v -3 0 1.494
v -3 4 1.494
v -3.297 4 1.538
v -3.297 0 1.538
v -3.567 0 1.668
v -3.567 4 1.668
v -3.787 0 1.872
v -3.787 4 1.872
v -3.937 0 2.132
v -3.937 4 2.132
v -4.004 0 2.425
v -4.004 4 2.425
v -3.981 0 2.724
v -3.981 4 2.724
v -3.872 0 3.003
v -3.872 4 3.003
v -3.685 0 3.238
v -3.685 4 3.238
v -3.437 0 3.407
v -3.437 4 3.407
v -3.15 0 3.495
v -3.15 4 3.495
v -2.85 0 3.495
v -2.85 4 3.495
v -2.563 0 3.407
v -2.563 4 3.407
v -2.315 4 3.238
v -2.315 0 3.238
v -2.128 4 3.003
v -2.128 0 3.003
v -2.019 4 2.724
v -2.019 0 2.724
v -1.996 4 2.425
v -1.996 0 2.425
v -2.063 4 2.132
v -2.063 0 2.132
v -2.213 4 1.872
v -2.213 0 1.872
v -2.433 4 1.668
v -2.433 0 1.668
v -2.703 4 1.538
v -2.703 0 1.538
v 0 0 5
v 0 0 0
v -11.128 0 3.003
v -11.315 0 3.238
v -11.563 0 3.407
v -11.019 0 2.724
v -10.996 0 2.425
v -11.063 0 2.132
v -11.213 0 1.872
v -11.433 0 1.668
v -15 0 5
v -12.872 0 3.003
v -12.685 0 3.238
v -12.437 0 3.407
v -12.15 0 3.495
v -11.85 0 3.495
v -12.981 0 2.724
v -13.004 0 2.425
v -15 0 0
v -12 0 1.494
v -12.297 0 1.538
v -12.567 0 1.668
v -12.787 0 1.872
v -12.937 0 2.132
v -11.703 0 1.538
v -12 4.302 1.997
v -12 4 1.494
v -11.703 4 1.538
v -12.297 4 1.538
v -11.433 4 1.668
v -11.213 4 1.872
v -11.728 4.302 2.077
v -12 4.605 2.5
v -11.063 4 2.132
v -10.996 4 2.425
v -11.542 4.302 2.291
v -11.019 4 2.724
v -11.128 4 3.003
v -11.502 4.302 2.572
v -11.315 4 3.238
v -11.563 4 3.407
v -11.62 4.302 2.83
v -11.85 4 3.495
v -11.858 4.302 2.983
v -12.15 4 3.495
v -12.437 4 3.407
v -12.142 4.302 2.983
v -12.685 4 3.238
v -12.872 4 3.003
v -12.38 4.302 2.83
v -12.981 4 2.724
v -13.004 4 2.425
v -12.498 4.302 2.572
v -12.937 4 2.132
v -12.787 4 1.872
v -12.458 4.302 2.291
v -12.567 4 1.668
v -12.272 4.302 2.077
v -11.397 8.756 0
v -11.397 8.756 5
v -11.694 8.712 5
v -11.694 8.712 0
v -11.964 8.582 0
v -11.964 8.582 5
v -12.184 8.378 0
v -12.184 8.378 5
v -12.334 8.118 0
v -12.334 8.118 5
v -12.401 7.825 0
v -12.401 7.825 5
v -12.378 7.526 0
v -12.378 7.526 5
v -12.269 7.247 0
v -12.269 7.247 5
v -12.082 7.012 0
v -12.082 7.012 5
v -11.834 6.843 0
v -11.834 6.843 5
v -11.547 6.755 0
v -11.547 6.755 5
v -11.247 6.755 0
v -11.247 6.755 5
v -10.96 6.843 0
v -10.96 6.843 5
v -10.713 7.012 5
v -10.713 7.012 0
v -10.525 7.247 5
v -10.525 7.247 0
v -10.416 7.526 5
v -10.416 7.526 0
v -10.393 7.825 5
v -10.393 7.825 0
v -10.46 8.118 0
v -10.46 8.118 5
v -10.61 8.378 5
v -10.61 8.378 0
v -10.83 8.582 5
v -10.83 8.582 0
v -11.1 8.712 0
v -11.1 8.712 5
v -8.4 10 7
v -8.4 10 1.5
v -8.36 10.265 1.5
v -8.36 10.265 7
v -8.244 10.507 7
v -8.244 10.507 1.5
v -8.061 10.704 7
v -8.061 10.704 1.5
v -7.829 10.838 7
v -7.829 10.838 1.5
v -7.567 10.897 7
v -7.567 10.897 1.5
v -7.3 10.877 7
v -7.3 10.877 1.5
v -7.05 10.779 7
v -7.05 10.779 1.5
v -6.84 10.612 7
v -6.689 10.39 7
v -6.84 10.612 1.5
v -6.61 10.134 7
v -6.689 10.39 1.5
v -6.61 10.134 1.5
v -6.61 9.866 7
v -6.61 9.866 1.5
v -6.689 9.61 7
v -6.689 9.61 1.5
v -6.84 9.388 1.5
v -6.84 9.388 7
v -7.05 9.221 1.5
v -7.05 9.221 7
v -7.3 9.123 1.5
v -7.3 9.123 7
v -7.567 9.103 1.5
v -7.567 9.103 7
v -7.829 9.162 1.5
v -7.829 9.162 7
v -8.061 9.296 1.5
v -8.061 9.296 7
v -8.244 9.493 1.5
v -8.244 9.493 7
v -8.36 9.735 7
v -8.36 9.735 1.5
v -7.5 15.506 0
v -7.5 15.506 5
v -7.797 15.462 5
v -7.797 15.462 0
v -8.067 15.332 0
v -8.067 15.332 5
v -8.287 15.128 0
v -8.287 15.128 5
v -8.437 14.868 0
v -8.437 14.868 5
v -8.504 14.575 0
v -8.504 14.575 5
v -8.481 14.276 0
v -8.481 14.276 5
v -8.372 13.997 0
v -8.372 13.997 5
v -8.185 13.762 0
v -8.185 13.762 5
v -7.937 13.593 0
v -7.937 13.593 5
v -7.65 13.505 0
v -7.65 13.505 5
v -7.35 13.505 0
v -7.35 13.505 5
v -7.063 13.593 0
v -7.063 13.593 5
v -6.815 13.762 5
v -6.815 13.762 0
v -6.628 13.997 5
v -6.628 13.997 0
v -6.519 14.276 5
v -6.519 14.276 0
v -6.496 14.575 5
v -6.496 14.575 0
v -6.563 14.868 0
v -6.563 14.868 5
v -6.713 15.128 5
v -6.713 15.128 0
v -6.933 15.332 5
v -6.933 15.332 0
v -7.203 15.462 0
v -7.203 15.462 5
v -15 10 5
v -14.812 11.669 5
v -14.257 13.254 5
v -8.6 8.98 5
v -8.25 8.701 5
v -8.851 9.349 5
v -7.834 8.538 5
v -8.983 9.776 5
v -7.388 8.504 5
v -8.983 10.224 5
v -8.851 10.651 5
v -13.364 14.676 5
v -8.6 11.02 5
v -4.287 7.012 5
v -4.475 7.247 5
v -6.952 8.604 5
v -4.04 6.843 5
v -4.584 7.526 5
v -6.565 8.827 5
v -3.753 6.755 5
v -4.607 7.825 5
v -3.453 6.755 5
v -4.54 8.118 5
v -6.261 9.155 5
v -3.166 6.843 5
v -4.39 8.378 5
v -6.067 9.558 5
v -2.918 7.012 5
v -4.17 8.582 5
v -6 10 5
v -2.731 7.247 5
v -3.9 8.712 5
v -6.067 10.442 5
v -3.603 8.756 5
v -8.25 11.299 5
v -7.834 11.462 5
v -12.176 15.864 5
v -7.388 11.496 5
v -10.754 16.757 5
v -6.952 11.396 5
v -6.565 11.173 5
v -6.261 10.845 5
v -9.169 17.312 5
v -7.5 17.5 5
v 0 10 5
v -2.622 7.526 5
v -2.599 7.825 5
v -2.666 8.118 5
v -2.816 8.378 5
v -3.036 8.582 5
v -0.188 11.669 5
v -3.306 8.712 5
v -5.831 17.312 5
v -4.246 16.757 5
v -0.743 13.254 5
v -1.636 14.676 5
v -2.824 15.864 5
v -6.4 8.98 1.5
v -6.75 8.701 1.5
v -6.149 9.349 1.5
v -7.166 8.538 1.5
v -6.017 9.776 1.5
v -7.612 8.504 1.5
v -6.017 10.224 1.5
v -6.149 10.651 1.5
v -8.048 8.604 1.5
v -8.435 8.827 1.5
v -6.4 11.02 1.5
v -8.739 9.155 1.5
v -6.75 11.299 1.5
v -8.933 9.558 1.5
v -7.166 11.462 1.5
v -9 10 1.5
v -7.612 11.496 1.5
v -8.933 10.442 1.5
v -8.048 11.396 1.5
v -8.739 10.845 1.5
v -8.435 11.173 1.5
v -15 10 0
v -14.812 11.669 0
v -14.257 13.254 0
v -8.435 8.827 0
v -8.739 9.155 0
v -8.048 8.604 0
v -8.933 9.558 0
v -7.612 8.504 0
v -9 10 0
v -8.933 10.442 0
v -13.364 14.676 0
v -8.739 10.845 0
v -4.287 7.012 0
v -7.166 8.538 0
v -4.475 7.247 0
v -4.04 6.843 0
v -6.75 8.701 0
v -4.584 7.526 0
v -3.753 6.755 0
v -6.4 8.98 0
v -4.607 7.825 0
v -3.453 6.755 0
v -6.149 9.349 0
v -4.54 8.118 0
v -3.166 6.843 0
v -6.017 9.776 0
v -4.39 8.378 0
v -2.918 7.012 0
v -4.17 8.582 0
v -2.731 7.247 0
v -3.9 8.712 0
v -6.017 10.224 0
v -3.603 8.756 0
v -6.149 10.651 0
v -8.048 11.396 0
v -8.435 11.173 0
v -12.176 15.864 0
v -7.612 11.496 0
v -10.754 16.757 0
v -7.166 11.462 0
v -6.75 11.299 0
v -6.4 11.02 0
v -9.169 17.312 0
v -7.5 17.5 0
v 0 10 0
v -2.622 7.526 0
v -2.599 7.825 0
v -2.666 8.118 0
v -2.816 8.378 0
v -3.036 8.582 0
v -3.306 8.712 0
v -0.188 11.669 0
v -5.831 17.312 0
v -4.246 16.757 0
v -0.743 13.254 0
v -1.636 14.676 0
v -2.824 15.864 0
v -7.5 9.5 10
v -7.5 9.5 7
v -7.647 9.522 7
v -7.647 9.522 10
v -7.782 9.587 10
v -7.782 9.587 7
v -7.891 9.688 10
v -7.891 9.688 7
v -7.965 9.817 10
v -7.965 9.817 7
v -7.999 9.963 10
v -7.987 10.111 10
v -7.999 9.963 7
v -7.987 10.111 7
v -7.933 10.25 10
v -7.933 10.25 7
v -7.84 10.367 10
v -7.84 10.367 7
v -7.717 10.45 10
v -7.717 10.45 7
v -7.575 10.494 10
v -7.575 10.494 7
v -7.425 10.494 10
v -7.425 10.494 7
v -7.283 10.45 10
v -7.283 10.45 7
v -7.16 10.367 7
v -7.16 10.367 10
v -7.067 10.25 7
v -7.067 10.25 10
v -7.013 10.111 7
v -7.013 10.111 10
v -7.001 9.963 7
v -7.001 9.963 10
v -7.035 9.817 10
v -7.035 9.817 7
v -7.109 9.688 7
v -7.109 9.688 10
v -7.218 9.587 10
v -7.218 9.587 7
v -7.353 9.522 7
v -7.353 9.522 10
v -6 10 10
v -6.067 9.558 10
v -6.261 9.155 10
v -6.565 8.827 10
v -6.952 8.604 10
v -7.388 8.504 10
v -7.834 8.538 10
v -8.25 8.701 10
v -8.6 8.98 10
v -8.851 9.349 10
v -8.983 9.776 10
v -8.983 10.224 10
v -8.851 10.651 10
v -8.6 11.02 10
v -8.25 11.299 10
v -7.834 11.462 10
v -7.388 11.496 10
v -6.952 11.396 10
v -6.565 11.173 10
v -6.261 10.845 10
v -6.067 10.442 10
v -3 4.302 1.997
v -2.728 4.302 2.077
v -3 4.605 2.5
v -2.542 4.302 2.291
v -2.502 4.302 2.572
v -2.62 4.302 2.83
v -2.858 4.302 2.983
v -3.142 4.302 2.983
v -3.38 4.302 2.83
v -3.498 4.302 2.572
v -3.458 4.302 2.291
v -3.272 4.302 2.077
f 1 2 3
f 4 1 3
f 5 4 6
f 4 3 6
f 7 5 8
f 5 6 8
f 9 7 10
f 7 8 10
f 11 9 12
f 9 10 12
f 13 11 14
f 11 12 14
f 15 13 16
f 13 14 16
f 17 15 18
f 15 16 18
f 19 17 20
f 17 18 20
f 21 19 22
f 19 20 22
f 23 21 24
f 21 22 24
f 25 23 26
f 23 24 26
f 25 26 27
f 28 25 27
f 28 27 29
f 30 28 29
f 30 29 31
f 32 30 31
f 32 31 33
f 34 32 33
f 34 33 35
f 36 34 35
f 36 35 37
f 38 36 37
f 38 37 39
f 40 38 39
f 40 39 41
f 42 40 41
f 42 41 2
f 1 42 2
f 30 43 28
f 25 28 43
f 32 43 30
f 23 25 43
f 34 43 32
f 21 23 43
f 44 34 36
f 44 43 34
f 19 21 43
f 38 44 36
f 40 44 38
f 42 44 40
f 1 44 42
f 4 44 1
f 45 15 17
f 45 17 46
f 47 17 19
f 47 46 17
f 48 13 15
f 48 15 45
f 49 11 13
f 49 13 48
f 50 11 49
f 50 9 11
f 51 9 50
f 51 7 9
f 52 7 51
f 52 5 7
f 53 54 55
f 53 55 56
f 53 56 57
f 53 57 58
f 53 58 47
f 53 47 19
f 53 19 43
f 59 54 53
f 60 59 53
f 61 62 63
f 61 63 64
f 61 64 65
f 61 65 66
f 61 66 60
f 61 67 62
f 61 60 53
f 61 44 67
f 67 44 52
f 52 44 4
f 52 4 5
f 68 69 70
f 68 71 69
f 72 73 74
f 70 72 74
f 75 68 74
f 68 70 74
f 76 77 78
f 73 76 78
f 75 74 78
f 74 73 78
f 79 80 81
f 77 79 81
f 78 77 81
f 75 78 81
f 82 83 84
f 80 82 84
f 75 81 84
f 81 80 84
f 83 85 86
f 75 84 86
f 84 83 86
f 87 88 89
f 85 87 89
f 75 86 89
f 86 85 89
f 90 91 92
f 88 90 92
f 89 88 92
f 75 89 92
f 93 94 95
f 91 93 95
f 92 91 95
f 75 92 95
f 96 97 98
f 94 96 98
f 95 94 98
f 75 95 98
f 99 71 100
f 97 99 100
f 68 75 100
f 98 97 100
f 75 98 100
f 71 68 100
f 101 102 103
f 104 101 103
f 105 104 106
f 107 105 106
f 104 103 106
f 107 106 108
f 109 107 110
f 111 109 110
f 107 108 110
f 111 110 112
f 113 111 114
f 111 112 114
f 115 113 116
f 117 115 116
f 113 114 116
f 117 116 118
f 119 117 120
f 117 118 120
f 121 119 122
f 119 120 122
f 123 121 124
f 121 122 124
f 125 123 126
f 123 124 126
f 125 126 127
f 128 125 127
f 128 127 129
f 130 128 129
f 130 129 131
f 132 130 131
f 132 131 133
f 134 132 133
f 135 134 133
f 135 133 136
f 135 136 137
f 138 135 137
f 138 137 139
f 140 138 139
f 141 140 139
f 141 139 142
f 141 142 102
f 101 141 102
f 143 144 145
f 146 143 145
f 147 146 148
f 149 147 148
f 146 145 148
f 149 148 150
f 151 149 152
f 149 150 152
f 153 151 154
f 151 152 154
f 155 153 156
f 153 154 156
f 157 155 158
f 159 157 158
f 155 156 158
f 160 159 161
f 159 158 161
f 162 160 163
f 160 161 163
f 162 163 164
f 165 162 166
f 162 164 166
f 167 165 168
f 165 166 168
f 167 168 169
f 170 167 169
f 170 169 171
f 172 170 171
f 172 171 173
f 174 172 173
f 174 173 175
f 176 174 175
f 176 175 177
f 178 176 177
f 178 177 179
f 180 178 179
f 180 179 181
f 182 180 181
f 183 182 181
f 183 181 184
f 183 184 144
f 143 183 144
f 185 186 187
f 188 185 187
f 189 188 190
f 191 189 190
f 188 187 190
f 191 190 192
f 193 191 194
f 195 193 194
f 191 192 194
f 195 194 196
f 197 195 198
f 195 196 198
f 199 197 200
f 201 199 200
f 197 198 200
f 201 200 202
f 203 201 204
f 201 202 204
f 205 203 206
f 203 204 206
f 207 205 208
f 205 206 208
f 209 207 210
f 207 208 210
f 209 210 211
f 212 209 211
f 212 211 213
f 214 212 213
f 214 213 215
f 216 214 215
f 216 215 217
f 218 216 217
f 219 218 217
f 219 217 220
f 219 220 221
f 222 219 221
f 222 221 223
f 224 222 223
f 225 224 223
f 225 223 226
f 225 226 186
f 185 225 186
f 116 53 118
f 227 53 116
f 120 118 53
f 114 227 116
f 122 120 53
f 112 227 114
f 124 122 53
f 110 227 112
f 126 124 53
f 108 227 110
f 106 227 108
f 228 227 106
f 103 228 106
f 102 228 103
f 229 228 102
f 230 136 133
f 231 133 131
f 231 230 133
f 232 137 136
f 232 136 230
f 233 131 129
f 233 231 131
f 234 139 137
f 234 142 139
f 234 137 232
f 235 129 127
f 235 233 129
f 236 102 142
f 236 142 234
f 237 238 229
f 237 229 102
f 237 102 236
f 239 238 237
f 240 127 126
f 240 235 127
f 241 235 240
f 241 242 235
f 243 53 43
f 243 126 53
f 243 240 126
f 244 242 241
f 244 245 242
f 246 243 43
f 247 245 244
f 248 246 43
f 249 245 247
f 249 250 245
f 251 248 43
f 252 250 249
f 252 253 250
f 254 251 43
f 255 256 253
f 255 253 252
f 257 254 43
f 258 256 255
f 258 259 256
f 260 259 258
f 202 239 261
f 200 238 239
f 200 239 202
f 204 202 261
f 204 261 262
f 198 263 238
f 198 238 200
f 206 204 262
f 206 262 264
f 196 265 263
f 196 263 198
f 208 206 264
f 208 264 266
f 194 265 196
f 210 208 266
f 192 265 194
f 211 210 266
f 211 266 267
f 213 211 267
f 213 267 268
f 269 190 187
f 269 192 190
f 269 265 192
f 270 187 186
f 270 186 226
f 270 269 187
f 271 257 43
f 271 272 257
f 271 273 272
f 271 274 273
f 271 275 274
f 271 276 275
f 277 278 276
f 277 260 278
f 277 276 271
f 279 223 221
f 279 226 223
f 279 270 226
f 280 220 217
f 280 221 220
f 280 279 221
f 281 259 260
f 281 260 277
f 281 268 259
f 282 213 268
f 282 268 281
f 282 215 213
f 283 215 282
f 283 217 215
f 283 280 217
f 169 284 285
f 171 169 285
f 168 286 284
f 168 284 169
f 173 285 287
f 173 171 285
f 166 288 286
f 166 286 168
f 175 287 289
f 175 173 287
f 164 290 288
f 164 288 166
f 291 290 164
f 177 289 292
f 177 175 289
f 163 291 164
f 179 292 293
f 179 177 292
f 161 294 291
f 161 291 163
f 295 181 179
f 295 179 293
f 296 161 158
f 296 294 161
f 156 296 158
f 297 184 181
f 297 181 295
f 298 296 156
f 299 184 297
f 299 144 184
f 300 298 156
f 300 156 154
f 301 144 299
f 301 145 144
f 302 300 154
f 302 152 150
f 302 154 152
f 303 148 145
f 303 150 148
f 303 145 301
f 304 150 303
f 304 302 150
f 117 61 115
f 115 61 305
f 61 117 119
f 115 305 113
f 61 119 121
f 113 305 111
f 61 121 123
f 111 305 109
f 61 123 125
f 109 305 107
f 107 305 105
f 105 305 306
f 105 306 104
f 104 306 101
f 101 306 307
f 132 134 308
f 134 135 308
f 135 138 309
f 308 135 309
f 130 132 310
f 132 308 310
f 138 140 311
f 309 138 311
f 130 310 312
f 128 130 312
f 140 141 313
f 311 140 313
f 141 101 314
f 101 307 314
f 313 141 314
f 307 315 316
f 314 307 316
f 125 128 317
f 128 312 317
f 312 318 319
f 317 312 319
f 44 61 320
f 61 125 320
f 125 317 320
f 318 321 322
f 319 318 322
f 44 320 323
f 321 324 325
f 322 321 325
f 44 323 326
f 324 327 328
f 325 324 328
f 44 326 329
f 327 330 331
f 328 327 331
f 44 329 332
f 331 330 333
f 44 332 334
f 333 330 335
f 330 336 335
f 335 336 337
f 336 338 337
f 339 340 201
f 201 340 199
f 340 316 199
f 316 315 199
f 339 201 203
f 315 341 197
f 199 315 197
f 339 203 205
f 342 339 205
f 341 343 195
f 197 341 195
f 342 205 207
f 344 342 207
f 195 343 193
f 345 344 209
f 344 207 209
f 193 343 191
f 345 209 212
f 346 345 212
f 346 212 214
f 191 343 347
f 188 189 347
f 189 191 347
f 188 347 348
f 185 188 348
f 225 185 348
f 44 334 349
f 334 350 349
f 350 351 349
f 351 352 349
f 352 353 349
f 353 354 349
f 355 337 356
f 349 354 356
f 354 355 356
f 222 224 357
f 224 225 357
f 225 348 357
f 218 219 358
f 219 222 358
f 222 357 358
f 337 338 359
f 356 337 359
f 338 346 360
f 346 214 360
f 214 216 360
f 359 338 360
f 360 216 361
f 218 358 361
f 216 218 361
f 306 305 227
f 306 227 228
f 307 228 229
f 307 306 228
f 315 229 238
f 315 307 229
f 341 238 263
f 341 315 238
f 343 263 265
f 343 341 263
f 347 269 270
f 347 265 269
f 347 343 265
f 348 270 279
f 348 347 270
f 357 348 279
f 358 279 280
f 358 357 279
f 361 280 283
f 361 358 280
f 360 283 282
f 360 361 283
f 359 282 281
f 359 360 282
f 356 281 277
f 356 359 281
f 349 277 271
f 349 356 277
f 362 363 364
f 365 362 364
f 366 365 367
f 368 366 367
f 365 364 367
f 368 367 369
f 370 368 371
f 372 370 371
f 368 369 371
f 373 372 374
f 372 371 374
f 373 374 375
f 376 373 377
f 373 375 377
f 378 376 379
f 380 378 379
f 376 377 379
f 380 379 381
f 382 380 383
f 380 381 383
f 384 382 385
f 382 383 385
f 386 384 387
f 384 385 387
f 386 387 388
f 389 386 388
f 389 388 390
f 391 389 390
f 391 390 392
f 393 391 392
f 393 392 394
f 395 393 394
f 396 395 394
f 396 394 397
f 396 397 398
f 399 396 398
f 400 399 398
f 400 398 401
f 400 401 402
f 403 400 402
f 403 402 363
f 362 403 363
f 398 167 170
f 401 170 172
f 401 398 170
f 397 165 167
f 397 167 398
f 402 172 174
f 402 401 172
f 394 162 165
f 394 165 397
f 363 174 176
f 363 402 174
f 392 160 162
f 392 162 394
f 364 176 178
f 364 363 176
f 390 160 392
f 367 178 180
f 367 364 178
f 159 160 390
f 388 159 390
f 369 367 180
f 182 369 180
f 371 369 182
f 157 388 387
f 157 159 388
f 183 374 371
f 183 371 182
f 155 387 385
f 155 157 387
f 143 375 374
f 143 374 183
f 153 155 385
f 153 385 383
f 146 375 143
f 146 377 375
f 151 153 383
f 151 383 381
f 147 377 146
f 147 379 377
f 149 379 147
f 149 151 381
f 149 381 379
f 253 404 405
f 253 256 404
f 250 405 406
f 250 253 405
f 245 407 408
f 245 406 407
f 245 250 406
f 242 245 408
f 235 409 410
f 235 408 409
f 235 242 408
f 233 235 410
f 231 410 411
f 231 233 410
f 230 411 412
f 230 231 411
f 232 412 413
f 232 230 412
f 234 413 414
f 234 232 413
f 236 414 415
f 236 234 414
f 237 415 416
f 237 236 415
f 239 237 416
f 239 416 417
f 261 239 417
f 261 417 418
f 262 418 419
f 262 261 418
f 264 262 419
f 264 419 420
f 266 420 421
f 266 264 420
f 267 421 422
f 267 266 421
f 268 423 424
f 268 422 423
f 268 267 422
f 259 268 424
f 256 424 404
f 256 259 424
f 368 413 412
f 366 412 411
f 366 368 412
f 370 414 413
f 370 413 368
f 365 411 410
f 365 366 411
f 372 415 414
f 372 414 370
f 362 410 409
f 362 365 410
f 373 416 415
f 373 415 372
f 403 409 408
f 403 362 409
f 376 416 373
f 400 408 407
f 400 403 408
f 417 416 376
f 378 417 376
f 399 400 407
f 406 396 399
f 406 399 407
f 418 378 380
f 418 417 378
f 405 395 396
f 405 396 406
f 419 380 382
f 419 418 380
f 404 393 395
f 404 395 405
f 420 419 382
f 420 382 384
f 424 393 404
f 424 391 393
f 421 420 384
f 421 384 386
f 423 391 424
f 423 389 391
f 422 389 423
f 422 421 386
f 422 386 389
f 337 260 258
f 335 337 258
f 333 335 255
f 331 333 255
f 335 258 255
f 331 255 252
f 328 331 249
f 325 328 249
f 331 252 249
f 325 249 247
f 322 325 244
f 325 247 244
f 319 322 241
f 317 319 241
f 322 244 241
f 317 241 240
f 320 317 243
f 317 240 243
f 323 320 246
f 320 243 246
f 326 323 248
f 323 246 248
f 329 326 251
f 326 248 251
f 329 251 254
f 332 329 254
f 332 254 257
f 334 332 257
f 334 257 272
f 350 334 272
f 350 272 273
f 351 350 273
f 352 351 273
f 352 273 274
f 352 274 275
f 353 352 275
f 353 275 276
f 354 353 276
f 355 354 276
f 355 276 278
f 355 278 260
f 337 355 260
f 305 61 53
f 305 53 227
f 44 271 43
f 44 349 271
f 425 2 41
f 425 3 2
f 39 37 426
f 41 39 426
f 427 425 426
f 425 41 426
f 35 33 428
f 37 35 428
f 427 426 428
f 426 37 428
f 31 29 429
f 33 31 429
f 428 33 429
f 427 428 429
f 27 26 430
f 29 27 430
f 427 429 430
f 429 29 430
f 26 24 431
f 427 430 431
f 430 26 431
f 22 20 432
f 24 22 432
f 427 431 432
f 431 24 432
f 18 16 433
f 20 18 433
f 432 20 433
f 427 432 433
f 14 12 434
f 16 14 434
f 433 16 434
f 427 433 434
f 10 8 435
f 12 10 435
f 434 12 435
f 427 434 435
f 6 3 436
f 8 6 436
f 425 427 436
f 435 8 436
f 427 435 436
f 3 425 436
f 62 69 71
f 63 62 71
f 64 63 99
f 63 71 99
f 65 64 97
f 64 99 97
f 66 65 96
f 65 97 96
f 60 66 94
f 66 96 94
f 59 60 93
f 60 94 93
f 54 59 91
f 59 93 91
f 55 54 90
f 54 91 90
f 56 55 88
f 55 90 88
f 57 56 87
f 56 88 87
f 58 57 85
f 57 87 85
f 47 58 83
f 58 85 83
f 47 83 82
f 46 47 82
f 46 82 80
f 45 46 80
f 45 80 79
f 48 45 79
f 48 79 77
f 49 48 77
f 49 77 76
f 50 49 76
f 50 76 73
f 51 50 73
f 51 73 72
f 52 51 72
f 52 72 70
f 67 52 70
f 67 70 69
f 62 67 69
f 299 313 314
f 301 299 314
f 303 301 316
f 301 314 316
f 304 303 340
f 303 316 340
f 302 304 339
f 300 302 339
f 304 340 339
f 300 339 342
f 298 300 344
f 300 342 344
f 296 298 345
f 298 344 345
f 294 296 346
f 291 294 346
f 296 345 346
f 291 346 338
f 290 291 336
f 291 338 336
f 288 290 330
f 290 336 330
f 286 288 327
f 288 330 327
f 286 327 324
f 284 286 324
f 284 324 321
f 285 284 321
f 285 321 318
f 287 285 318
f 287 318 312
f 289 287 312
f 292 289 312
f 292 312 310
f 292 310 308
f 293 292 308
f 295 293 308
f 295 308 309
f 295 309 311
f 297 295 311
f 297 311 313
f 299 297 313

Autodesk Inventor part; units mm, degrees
ref_plane "YZ Plane" through (0, 0, 0) normal (1, 0, 0) x (0, 1, 0)
ref_plane "XZ Plane" through (0, 0, 0) normal (0, 1, 0) x (-1, 0, 0)
sketch "Sketch1" plane through (0, 0, 0) normal (0, 0, 1) x (1, 0, 0)
  line L0 (0, 0) -> (-15, 0)
  line L1 (-15, 0) -> (-15, 10)
  line L2 (-15, 10) -> (0, 10)
  line L3 (0, 10) -> (0, 0)
  circle A0 centre (-7.5, 10) radius 7.5
  dimension "d0" = 15
  dimension "d1" = 10
extrude "Extrusion1" add sketch "Sketch1" along normal blind 5
sketch "Sketch2" plane through (0, 0, 5) normal (0, 0, 1) x (1, 0, 0)
  arc A0 (0, 10) -> (-15, 10) centre (-7.5, 10) ccw projected
  circle A1 centre (-7.5, 10) radius 1.5
  point P0 (0, 0)
  dimension "d4" = 3
extrude "Extrusion2" add sketch "Sketch2" along normal blind 5
sketch "Sketch3" plane through (-7.5, 10, 10) normal (0, 0, 1) x (1, 0, 0)
  point P0 (7.5, -10)
  point P1 (0, 0)
  point P2 (0, 0)
hole "Hole1" at (-7.5, 10, 10) direction (0, 0, -1) diameter 1 end through all
sketch "Sketch4" plane through (0, 0, 0) normal (0, 0, -1) x (-1, 0, 0)
  circle A0 centre (7.5, 10) radius 0.5 projected
  circle A1 centre (7.5, 10) radius 0.9
  point P0 (0, 0)
  dimension "d14" = 1.8
extrude "Extrusion3" cut sketch "Sketch4" against normal blind 7 contours A0 | A1
sketch "Sketch5" plane through (0, 0, 0) normal (0, 0, -1) x (-1, 0, 0)
  circle A0 centre (7.5, 10) radius 0.9 projected
  circle A1 centre (7.5, 10) radius 1.5
  point P0 (0, 0)
  dimension "d17" = 3
extrude "Extrusion4" cut sketch "Sketch5" against normal blind 1.5
sketch "Sketch7" plane through (-15, 0, 0) normal (0, -1, 0) x (1, 0, 0)
  line L0 (15, 0) -> (15, 5) projected
  line L1 (0, 0) -> (0, 5) projected
  line L2 (0, 0) -> (15, 0) projected
  point P0 (12, 2.5)
  point P1 (3, 2.5)
  dimension "d21" = 3
  dimension "d22" = 3
  dimension "d23" = 2.5
  dimension "d24" = 2.5
hole "Hole2" at (-3, 0, 2.5) at (-12, 0, 2.5) direction (0, 1, 0) diameter 2.013 depth 4 tip angle 118 thread size "M2.5x0.45" class "6H" standard "ISO Metric profile"
sketch "Sketch8" plane through (0, 0, 0) normal (0, 0, -1) x (-1, 0, 0)
  circle A0 centre (7.5, 10) radius 0.5 projected
  circle A1 centre (7.5, 10) radius 4.5 construction
  point P0 (0, 0)
  point P1 (7.5, 14.5)
  point P2 (11.3971, 7.75)
  point P3 (3.6029, 7.75)
  dimension "d32" = 9
  dimension "d33" = 120
  dimension "d34" = 120
hole "Hole3" at (-7.5, 14.5, 0) at (-11.3971, 7.75, 0) at (-3.6029, 7.75, 0) direction (0, 0, 1) diameter 2.013 end through all thread size "M2.5x0.45" class "6H" standard "ISO Metric profile"
sketch "Sketch9" plane through (-7.5, 10, 10) normal (0, 0, 1) x (1, 0, 0)
  circle A0 centre (0, 0) radius 0.9 projected
  point P0 (7.5, -10)
ref_plane "Work Plane1" through (-7.5, 10, 10) normal (1, 0, 0) x (0, 0, -1)
properties part number "FillLine-SealFlange" material "Brass, Soft Yellow"
